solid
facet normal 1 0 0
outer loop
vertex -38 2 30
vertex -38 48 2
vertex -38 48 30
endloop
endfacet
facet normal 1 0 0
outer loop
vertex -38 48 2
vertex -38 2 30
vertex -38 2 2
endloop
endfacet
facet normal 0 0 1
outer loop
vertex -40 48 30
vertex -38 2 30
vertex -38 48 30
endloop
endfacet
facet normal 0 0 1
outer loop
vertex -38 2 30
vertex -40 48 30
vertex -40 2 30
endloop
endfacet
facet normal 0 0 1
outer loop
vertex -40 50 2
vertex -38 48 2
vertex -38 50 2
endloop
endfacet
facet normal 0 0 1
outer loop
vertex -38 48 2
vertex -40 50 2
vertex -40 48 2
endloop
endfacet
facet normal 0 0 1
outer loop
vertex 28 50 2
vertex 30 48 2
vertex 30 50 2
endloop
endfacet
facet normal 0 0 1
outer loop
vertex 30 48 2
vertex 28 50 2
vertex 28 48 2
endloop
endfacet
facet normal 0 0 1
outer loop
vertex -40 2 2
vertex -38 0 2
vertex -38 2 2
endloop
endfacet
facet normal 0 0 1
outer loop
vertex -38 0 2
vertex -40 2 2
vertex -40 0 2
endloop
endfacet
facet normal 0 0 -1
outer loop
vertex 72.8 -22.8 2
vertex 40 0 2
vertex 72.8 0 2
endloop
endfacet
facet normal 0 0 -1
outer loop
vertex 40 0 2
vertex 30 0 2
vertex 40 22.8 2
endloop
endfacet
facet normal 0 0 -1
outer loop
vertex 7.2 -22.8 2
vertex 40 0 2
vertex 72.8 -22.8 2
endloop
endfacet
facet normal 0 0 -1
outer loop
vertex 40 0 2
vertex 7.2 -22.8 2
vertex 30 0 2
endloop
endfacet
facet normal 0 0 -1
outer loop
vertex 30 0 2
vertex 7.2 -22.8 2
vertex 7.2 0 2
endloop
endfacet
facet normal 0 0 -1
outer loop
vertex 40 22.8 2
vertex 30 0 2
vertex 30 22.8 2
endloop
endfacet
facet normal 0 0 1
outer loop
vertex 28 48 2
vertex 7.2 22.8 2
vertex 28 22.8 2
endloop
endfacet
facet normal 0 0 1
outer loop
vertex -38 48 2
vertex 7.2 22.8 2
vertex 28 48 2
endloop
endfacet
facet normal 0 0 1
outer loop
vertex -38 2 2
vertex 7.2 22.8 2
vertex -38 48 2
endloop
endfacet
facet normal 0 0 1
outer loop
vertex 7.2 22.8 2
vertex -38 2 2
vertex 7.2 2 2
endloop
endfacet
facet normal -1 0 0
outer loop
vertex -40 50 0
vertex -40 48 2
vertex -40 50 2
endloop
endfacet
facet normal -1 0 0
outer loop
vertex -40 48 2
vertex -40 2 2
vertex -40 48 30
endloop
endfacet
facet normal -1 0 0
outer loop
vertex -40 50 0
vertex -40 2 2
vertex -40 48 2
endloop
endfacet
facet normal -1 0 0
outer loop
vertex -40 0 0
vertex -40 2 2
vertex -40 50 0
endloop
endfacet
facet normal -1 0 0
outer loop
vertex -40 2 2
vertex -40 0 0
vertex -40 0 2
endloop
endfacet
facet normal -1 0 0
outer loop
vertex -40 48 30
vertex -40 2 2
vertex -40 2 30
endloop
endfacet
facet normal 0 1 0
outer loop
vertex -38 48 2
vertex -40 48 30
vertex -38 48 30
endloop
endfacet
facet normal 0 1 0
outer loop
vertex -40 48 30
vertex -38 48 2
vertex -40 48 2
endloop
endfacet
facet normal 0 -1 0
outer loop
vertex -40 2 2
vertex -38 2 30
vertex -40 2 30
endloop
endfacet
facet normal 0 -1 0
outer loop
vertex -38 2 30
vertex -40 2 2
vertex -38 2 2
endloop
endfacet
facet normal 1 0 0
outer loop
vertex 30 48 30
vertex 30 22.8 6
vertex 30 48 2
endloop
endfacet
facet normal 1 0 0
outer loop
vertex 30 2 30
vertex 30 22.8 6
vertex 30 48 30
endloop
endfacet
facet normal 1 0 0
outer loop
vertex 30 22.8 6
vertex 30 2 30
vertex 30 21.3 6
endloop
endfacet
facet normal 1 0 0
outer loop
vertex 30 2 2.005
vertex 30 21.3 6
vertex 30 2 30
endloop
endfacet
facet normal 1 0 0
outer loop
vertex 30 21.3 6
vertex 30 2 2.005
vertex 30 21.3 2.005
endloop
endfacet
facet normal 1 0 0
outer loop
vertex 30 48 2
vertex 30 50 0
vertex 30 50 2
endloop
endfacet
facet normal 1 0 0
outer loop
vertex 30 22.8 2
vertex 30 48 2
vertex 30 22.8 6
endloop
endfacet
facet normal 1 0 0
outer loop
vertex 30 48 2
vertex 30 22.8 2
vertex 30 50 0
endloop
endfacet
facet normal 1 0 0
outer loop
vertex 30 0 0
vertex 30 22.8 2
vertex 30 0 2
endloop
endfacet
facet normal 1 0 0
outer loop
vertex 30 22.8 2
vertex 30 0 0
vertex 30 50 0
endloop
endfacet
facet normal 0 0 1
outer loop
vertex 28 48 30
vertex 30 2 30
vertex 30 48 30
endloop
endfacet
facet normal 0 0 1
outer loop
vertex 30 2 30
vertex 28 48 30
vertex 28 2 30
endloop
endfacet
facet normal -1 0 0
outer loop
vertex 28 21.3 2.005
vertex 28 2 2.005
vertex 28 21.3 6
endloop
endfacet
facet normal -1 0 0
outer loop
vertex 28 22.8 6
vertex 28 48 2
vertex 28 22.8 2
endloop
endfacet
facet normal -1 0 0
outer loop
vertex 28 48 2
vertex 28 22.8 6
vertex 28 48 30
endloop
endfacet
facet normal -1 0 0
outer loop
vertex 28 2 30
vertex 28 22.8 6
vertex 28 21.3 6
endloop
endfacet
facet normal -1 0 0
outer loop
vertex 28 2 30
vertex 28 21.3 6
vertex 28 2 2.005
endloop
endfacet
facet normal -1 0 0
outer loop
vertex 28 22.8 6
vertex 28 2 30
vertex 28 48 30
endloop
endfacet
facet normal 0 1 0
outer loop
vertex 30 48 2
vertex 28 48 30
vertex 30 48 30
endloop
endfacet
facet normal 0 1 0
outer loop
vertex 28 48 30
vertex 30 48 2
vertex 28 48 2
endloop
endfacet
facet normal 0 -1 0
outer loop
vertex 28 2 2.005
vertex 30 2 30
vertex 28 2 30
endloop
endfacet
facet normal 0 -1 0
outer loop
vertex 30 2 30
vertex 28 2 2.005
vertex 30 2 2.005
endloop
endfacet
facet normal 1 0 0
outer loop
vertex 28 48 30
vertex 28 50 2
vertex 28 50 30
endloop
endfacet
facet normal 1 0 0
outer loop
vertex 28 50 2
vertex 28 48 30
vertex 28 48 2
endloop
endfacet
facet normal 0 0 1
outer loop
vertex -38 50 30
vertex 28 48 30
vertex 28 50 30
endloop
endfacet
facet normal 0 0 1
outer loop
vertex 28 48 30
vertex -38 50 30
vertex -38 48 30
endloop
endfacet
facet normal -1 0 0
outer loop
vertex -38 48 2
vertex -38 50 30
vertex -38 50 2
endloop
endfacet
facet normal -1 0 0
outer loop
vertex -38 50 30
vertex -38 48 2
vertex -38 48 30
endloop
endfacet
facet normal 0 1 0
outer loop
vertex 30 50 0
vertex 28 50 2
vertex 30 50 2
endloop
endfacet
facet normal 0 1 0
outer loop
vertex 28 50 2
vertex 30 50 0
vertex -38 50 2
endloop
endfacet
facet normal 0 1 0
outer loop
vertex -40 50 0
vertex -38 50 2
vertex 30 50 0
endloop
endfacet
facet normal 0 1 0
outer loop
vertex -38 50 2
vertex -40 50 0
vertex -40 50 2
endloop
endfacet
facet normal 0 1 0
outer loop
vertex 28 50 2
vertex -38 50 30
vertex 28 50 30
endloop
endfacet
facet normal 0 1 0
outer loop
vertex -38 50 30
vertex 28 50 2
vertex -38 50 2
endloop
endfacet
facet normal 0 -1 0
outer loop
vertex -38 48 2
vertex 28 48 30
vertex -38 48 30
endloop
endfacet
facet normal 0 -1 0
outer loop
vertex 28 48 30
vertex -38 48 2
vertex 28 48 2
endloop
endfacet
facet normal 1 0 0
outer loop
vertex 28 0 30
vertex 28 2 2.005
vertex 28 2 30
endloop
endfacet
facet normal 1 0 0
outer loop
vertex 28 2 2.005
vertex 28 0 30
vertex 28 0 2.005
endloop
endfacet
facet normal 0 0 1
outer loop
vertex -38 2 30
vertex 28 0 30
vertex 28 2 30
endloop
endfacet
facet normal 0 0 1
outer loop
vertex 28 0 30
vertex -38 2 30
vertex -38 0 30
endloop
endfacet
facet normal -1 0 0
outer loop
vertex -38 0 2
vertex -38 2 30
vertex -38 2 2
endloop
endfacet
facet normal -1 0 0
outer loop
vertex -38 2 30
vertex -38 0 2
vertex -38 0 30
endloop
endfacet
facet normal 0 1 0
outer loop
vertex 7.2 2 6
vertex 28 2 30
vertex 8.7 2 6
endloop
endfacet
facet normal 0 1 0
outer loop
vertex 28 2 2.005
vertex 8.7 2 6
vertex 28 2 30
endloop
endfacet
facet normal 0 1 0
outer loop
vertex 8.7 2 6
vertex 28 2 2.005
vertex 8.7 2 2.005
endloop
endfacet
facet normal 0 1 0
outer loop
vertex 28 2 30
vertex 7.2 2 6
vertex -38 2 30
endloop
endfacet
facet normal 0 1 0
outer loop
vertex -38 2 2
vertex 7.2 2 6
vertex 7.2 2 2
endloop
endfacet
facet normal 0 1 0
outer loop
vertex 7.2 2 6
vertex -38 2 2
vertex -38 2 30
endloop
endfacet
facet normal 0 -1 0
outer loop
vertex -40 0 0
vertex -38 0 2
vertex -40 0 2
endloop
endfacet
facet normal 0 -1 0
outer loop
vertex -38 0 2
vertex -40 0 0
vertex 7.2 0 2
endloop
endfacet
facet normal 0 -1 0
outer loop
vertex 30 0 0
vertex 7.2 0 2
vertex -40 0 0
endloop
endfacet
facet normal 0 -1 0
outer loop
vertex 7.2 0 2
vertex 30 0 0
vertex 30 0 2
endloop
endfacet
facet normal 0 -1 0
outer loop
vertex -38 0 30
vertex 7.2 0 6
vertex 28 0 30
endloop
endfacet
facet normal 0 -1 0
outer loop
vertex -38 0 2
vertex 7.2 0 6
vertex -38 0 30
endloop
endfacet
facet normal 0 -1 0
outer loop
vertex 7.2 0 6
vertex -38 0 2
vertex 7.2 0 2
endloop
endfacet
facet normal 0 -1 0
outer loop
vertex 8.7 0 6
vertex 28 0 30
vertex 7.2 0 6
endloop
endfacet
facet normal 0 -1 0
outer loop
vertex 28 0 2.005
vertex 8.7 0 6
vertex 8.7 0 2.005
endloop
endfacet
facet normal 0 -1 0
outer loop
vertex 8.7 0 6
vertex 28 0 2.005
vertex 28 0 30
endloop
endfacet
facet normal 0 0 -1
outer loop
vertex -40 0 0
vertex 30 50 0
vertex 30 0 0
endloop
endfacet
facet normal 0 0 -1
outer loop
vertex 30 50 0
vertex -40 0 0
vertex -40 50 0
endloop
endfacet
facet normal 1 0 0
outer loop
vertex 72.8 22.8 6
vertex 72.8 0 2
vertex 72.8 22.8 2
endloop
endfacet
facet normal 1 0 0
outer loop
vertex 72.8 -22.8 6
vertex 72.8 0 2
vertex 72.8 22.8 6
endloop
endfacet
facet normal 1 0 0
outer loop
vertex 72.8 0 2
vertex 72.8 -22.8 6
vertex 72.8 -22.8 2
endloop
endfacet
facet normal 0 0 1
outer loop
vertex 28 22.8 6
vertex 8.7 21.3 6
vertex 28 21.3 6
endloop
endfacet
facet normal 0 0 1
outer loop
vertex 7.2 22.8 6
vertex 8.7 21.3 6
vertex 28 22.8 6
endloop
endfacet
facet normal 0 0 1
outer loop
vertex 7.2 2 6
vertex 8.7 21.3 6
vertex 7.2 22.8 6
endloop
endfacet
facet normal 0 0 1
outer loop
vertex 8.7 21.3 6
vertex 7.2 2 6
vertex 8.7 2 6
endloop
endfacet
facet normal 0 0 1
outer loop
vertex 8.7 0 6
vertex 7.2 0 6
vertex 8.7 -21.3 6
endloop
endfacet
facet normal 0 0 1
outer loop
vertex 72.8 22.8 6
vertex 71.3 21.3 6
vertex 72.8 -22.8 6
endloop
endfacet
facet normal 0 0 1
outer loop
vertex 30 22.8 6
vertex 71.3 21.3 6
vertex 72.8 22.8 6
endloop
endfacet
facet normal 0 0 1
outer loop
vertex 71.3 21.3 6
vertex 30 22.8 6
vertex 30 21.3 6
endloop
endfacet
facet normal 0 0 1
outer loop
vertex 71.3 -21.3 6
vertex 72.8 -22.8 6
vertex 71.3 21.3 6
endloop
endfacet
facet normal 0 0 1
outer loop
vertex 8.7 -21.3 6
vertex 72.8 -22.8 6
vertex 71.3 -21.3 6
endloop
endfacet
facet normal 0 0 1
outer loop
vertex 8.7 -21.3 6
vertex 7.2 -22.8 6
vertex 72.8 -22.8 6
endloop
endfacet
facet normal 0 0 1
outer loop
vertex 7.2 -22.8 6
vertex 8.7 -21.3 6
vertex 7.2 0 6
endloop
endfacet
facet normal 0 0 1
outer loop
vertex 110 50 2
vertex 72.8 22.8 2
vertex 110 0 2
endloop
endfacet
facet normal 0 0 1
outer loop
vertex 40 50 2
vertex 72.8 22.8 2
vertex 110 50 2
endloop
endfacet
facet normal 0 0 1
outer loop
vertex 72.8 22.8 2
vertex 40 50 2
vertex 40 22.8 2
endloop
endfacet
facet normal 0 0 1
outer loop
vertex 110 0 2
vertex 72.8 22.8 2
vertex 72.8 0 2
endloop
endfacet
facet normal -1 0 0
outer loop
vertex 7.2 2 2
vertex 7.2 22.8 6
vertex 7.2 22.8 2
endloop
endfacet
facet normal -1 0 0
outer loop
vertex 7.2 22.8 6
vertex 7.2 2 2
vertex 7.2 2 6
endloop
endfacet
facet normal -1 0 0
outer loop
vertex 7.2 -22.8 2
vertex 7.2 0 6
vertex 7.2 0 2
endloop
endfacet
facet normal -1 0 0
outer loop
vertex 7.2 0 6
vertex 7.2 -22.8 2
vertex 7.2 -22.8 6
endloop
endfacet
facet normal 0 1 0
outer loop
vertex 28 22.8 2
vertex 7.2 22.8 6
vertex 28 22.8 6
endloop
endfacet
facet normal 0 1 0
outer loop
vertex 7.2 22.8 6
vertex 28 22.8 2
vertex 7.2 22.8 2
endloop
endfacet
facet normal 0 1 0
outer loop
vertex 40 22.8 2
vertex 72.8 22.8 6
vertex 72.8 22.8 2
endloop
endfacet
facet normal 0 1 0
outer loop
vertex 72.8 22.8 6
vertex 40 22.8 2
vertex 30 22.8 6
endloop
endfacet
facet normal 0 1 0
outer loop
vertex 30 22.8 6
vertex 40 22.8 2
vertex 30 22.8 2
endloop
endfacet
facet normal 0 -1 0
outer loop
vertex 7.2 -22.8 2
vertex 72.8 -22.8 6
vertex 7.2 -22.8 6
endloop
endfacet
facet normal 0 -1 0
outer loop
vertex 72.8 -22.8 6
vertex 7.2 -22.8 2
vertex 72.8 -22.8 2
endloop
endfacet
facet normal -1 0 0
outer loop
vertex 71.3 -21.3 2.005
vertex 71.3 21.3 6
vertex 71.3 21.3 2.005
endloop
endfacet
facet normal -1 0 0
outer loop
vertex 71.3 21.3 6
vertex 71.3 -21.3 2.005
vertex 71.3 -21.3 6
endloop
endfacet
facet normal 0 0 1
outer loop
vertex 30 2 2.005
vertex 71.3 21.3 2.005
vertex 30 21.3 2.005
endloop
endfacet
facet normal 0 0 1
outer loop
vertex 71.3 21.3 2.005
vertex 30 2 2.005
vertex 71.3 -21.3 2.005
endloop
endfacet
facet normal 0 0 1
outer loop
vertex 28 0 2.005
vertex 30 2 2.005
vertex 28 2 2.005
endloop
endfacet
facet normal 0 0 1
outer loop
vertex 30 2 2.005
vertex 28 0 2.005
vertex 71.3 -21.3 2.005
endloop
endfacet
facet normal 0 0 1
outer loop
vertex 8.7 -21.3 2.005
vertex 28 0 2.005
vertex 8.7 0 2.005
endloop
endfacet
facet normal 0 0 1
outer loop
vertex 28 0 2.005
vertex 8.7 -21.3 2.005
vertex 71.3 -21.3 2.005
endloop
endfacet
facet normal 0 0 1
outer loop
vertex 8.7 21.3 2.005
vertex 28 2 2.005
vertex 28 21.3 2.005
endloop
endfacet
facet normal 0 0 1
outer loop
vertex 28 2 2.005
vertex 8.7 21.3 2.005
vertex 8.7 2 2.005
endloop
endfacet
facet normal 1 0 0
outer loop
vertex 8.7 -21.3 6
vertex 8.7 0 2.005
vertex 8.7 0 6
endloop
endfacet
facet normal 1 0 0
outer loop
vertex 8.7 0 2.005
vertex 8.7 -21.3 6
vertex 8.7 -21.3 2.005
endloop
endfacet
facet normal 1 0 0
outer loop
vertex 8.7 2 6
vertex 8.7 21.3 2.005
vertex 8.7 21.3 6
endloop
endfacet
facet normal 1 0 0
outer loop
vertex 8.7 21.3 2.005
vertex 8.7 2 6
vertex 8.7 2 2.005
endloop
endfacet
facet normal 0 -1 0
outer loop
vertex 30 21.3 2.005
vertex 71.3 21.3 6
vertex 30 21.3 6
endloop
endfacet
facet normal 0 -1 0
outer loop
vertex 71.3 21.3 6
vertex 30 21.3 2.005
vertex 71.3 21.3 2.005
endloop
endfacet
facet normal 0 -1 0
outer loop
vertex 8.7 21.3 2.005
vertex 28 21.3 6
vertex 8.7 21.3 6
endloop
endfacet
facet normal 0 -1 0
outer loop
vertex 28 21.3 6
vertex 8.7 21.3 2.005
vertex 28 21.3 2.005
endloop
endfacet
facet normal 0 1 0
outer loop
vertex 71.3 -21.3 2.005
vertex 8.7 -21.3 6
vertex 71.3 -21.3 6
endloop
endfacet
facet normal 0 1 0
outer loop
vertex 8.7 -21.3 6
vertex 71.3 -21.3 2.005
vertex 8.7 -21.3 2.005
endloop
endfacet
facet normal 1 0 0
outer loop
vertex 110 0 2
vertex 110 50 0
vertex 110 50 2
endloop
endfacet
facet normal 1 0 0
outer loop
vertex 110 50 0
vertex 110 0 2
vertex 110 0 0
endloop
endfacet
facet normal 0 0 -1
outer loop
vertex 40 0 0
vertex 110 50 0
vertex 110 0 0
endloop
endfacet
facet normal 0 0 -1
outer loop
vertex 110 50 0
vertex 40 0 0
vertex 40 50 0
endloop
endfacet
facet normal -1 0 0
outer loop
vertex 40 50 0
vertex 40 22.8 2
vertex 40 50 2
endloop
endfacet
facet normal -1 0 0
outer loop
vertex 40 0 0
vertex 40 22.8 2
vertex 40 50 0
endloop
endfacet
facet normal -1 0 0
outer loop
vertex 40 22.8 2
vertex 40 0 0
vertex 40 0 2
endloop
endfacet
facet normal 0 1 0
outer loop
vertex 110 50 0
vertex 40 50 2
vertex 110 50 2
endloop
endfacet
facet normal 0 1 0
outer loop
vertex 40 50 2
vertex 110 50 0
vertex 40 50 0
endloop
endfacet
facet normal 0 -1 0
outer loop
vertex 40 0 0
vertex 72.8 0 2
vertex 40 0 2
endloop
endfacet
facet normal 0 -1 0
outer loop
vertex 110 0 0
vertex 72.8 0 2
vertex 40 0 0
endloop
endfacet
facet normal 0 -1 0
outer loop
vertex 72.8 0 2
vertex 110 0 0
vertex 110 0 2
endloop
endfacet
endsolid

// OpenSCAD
$fn = 64;

// --- Box Dimensions ---
BOX_OUT_X = 70;
BOX_OUT_Y = 50;
BOX_OUT_Z = 30;
WALL_THK  = 2;
FLOOR_THK = 2;

// Derived box inner dimensions
BOX_IN_X = BOX_OUT_X - 2 * WALL_THK;
BOX_IN_Y = BOX_OUT_Y - 2 * WALL_THK;
BOX_IN_Z = BOX_OUT_Z - FLOOR_THK;

// --- Lid Dimensions ---
LID_PLATE_X = 70;
LID_PLATE_Y = 50;
LID_PLATE_Z = 2;
LIP_OUT_X   = 65.6;
LIP_OUT_Y   = 45.6;
LIP_THK     = 1.5;
LIP_H       = 4;

LIP_IN_X = LIP_OUT_X - 2 * LIP_THK;
LIP_IN_Y = LIP_OUT_Y - 2 * LIP_THK;

// --- Part 1: Box ---
translate([-40, 0, 0]) {
    // Floor
    cube([BOX_OUT_X, BOX_OUT_Y, FLOOR_THK]);
    
    // Walls
    union() {
        // Left wall
        translate([0, WALL_THK, FLOOR_THK])
            cube([WALL_THK, BOX_IN_Y, BOX_IN_Z]);
        // Right wall
        translate([BOX_OUT_X - WALL_THK, WALL_THK, FLOOR_THK])
            cube([WALL_THK, BOX_IN_Y, BOX_IN_Z]);
        // Front wall
        translate([WALL_THK, BOX_OUT_Y - WALL_THK, FLOOR_THK])
            cube([BOX_IN_X, WALL_THK, BOX_IN_Z]);
        // Back wall
        translate([WALL_THK, 0, FLOOR_THK])
            cube([BOX_IN_X, WALL_THK, BOX_IN_Z]);
    }
}

// --- Part 2: Lid ---
translate([40, 0, 0]) {
    // Plate
    cube([LID_PLATE_X, LID_PLATE_Y, LID_PLATE_Z]);
    
    // Lip (hollow rectangle)
    difference() {
        // Outer lip block
        translate([-LIP_OUT_X/2, -LIP_OUT_Y/2, LID_PLATE_Z])
            cube([LIP_OUT_X, LIP_OUT_Y, LIP_H]);
            
        // Inner cutout (extends past top face by 0.02mm to avoid coplanar faces)
        translate([-LIP_IN_X/2, -LIP_IN_Y/2, LID_PLATE_Z + 0.005])
            cube([LIP_IN_X, LIP_IN_Y, LIP_H + 0.02]);
    }
}
